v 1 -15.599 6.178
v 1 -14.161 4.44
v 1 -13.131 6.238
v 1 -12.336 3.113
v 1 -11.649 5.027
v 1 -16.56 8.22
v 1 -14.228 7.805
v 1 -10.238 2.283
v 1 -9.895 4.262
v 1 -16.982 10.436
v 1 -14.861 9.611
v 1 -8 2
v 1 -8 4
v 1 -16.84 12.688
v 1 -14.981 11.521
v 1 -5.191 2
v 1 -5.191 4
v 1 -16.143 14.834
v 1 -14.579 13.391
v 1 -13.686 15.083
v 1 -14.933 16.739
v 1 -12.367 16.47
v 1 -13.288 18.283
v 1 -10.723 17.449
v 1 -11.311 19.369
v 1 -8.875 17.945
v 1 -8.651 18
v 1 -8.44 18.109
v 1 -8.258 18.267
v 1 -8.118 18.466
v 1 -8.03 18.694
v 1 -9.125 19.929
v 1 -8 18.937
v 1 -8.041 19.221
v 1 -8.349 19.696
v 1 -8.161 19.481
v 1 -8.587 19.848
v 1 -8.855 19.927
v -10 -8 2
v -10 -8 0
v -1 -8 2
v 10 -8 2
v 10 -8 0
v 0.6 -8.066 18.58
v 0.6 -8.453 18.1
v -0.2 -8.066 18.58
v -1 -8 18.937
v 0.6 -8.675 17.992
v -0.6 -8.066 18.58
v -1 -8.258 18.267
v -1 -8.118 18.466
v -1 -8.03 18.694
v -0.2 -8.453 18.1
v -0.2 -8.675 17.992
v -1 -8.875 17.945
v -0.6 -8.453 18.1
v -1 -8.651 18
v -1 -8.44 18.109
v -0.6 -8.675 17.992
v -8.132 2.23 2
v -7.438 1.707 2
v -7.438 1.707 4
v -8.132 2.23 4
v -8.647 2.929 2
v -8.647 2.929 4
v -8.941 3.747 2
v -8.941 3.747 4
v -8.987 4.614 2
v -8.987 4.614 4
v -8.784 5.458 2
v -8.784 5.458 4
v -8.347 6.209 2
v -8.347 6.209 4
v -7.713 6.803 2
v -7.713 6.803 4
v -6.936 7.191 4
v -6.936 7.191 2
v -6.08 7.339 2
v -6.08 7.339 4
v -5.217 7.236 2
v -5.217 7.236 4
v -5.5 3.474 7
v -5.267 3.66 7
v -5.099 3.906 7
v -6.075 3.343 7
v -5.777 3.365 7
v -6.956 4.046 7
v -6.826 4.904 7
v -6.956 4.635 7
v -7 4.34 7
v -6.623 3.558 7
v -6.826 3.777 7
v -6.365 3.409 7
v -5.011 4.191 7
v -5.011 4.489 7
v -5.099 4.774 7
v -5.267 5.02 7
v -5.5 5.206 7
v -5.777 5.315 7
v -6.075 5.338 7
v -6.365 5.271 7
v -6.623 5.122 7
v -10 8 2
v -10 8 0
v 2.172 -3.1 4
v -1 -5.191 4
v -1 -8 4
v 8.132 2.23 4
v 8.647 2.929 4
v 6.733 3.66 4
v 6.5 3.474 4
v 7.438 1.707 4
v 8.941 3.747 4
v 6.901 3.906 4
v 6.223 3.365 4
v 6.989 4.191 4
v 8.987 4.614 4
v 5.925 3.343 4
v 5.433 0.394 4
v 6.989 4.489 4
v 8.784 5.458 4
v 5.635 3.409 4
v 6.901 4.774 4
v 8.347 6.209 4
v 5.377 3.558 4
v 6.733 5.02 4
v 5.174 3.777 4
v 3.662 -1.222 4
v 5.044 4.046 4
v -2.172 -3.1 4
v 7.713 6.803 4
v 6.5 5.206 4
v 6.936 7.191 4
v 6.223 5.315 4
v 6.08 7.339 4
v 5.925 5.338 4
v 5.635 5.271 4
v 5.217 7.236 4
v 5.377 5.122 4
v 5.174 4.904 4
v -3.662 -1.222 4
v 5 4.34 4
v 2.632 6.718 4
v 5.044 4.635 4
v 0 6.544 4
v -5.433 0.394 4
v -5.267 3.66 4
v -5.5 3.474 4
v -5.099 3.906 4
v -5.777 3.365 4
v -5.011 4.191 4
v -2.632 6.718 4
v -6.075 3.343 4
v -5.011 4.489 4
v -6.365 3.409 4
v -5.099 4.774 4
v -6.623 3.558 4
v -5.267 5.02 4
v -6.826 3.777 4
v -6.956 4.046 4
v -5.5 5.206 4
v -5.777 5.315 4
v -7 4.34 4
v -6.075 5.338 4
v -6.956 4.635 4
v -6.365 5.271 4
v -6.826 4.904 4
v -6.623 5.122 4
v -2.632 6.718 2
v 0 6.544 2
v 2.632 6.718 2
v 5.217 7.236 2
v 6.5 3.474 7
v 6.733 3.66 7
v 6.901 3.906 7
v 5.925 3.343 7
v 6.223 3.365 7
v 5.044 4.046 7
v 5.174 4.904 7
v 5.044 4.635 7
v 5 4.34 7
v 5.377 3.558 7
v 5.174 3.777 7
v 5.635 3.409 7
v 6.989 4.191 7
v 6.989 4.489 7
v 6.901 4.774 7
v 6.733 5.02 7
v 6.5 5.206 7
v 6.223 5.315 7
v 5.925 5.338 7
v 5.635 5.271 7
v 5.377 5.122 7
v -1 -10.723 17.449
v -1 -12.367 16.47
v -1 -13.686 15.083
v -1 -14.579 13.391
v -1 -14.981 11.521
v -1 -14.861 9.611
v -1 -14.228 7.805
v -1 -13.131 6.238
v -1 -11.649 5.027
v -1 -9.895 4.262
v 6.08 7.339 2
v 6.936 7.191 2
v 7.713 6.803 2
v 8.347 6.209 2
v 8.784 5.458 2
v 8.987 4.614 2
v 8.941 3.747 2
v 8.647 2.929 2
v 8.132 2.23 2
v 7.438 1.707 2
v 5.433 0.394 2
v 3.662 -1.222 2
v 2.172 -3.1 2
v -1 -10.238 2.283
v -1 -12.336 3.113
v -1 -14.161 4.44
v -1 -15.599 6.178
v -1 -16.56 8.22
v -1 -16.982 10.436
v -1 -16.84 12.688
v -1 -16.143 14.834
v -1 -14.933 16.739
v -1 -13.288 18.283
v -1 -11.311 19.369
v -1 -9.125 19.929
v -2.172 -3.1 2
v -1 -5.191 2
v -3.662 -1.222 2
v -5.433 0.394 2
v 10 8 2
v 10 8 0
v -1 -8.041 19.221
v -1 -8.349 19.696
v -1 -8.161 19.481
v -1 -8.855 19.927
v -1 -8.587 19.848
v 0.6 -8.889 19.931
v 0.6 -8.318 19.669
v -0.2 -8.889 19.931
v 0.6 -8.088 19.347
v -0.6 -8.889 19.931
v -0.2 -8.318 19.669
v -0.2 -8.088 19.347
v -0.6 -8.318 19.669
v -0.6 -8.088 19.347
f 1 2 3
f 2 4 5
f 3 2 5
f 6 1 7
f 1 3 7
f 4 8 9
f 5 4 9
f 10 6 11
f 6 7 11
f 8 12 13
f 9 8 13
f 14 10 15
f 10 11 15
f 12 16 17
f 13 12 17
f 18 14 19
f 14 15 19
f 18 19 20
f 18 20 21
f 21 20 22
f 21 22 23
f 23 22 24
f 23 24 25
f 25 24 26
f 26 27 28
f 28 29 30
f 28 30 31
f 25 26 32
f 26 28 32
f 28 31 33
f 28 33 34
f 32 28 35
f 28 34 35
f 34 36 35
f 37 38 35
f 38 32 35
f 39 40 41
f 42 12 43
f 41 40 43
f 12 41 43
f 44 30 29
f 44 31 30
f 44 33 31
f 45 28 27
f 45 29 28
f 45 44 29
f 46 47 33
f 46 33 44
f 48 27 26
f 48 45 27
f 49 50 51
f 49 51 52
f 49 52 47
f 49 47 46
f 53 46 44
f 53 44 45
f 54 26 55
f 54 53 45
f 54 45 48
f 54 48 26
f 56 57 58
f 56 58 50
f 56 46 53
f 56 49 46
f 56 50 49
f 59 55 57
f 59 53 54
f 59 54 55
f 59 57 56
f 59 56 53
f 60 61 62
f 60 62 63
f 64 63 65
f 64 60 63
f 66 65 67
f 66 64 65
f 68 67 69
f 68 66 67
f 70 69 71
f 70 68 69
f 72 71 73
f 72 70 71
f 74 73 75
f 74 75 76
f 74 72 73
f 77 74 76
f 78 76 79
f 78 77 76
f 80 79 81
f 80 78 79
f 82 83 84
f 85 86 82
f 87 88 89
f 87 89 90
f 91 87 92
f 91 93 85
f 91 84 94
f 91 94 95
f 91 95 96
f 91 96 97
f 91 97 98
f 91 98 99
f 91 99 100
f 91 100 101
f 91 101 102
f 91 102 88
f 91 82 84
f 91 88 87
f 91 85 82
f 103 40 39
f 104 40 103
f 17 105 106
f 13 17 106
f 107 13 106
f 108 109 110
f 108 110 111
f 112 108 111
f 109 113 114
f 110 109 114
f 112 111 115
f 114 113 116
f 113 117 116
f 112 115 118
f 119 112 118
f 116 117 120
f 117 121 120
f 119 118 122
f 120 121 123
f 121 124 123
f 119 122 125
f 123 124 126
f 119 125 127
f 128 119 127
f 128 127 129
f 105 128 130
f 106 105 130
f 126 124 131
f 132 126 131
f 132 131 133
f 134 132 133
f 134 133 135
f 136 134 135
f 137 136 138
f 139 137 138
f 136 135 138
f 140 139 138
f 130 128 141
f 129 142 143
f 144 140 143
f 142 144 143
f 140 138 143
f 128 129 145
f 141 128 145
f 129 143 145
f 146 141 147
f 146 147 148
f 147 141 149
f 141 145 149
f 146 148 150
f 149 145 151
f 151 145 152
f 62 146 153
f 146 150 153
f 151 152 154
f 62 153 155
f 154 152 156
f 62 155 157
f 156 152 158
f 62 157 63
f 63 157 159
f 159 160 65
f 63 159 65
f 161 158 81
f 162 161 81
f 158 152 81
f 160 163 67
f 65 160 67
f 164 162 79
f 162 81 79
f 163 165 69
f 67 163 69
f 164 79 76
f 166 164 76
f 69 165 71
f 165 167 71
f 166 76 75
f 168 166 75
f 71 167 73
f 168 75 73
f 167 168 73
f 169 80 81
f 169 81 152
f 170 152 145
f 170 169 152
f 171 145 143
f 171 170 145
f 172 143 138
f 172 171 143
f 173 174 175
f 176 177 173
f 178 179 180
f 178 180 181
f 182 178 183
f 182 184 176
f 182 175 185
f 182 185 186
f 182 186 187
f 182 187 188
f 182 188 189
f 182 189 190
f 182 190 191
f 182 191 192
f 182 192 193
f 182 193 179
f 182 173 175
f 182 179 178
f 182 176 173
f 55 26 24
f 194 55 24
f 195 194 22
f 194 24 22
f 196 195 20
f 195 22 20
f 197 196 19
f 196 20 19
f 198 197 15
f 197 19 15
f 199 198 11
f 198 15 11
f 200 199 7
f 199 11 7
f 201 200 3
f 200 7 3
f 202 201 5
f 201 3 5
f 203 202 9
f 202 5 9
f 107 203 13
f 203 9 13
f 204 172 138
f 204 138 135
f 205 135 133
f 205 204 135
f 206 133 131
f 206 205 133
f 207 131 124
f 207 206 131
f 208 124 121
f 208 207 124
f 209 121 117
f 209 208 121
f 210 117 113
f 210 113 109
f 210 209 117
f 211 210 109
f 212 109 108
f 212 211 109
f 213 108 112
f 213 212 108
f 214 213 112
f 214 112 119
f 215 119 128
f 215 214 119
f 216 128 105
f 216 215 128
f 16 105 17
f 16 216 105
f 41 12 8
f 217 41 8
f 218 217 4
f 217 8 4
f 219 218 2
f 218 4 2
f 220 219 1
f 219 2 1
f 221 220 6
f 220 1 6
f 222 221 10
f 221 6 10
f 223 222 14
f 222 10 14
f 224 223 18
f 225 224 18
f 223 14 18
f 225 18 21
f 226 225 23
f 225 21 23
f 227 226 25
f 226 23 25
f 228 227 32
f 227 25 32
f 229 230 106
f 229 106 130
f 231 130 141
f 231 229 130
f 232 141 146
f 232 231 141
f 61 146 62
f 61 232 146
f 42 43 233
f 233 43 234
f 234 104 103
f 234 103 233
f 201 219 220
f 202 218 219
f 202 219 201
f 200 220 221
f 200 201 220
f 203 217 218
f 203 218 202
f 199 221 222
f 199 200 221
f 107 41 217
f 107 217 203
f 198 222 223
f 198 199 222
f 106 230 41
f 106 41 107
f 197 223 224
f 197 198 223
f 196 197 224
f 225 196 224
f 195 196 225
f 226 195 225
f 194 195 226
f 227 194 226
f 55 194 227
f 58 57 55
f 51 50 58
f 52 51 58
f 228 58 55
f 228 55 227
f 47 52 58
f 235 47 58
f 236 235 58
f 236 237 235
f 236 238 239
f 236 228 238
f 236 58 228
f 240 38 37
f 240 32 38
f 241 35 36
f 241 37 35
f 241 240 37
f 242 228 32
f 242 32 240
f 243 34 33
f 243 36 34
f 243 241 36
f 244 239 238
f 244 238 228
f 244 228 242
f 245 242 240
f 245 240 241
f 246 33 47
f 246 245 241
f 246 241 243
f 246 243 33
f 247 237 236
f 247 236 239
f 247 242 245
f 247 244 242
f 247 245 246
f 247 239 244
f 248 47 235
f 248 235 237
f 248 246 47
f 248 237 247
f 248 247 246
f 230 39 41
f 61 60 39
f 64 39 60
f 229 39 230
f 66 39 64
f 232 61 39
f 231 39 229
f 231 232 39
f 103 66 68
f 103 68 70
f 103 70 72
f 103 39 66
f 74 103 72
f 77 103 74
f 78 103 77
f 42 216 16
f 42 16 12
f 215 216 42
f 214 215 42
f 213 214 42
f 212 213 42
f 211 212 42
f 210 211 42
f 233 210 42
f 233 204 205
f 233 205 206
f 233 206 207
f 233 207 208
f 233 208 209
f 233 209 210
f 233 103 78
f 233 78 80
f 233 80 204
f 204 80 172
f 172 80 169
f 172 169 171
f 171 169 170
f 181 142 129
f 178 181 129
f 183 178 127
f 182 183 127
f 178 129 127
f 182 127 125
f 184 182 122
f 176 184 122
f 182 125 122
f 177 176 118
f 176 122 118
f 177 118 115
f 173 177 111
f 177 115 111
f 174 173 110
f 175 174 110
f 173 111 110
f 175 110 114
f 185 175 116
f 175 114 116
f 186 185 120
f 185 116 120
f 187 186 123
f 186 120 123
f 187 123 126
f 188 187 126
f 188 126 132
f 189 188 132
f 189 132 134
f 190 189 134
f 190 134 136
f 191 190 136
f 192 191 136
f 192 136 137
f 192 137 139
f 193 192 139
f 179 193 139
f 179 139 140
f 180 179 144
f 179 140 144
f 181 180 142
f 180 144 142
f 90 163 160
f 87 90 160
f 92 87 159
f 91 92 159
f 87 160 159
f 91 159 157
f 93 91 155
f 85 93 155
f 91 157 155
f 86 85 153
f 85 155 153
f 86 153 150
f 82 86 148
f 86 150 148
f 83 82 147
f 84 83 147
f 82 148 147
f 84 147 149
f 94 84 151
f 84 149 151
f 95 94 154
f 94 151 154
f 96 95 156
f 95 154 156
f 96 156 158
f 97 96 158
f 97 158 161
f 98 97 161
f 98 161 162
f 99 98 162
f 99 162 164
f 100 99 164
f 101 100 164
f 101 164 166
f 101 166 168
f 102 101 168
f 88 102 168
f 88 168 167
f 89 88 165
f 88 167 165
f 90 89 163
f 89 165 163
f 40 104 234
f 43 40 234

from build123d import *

# Parameters (mm, degrees)
SKETCH1_W           = 20
SKETCH1_H           = 16
BOSS_EXTRUDE1_DEPTH = 2
BOSS_EXTRUDE2_DEPTH = 2
BOSS_EXTRUDE3_DEPTH = 1
FILLET1_START       = -2
FILLET1_DEPTH       = 4
SKETCH4_R           = 1
BOSS_EXTRUDE4_DEPTH = 3


with BuildPart() as part:
    # Sketch1 → Boss-Extrude1 (new body)
    with BuildSketch(Plane.XY):
        Rectangle(SKETCH1_W, SKETCH1_H)
    extrude(amount=BOSS_EXTRUDE1_DEPTH)

    # Sketch2 → Boss-Extrude2 (add)
    with BuildSketch(Plane.XY.offset(2)):
        with BuildLine():
            Line((-1, -8), (-1, -5.19120215))
            ThreePointArc((-1, -5.19120215), (-3.662465131, -1.222418993), (-7.438132905, 1.707477453))
            ThreePointArc((-7.438132905, 1.707477453), (-8.78383647, 5.458451445), (-5.217391304, 7.236425814))
            ThreePointArc((-5.217391304, 7.236425814), (0, 6.543906954), (5.217391304, 7.236425814))
            ThreePointArc((5.217391304, 7.236425814), (8.78383647, 5.458451445), (7.438132905, 1.707477453))
            ThreePointArc((7.438132905, 1.707477453), (3.662465131, -1.222418993), (1, -5.19120215))
            Line((1, -5.19120215), (1, -8))
            Line((1, -8), (-1, -8))
        make_face()
    extrude(amount=BOSS_EXTRUDE2_DEPTH)

    # Sketch3 → Boss-Extrude3 (add, symmetric)
    with BuildSketch(Plane(origin=(0, 0, 0), x_dir=(0, 0, -1), z_dir=(1, 0, 0))):
        with BuildLine():
            Line((-4, -8), (-2, -8))
            ThreePointArc((-2, -8), (-11, -17), (-20, -8))
            Line((-20, -8), (-18, -8))
            ThreePointArc((-18, -8), (-11, -15), (-4, -8))
        make_face()
    extrude(amount=BOSS_EXTRUDE3_DEPTH, both=True)

    # Fillet1: read off the stored shape, not the designer's step
    # Fillet1 outline → Fillet1 (cut)
    with BuildSketch(Plane.YZ.offset(FILLET1_START)):
        with BuildLine():
            ThreePointArc((-8, 20), (-8.563606213, 19.982335333), (-9.125, 19.929410675))
            add(Edge.make_bspline(
                [(-9.125, 19.929410675), (-8.857196429, 19.963150753), (-8.534549287, 19.913651104), (-8.211558936, 19.723387149), (-8.000000009, 19.372242351), (-8, 18.937253953)],
                knots=[0, 0, 0, 0, 0, 0, 0.531373028, 0.531373028, 0.531373028, 0.531373028, 0.531373028, 0.531373028], degree=5, weights=[1, 0.787450789, 0.631373036, 0.531766743, 0.488631909, 0.501968534]))
            Line((-8, 18.937253953), (-8, 20))
        make_face()
        with BuildLine():
            Line((-8, 18), (-8, 18.937253953))
            add(Edge.make_bspline(
                [(-8, 18.937253953), (-7.999999993, 18.572372269), (-8.153666641, 18.269213464), (-8.39236455, 18.072074091), (-8.646114708, 17.973934028), (-8.875, 17.945097192)],
                knots=[0.531373028, 0.531373028, 0.531373028, 0.531373028, 0.531373028, 0.531373028, 1, 1, 1, 1, 1, 1], degree=5, weights=[0.501968534, 0.513730332, 0.569414377, 0.66902067, 0.812549211, 1]))
            ThreePointArc((-8.875, 17.945097192), (-8.438360388, 17.986260815), (-8, 18))
        make_face()
    extrude(amount=FILLET1_DEPTH, mode=Mode.SUBTRACT)

    # Sketch4 → Boss-Extrude4 (add)
    with BuildSketch(Plane.XY.offset(4)):
        with Locations(Location((-6, 4.340303643, 0), (0, 0, 180))):
            Circle(SKETCH4_R)
        with Locations(Location((6, 4.340303643, 0), (0, 0, 180))):
            Circle(SKETCH4_R)
    extrude(amount=BOSS_EXTRUDE4_DEPTH)


solid = part.part
